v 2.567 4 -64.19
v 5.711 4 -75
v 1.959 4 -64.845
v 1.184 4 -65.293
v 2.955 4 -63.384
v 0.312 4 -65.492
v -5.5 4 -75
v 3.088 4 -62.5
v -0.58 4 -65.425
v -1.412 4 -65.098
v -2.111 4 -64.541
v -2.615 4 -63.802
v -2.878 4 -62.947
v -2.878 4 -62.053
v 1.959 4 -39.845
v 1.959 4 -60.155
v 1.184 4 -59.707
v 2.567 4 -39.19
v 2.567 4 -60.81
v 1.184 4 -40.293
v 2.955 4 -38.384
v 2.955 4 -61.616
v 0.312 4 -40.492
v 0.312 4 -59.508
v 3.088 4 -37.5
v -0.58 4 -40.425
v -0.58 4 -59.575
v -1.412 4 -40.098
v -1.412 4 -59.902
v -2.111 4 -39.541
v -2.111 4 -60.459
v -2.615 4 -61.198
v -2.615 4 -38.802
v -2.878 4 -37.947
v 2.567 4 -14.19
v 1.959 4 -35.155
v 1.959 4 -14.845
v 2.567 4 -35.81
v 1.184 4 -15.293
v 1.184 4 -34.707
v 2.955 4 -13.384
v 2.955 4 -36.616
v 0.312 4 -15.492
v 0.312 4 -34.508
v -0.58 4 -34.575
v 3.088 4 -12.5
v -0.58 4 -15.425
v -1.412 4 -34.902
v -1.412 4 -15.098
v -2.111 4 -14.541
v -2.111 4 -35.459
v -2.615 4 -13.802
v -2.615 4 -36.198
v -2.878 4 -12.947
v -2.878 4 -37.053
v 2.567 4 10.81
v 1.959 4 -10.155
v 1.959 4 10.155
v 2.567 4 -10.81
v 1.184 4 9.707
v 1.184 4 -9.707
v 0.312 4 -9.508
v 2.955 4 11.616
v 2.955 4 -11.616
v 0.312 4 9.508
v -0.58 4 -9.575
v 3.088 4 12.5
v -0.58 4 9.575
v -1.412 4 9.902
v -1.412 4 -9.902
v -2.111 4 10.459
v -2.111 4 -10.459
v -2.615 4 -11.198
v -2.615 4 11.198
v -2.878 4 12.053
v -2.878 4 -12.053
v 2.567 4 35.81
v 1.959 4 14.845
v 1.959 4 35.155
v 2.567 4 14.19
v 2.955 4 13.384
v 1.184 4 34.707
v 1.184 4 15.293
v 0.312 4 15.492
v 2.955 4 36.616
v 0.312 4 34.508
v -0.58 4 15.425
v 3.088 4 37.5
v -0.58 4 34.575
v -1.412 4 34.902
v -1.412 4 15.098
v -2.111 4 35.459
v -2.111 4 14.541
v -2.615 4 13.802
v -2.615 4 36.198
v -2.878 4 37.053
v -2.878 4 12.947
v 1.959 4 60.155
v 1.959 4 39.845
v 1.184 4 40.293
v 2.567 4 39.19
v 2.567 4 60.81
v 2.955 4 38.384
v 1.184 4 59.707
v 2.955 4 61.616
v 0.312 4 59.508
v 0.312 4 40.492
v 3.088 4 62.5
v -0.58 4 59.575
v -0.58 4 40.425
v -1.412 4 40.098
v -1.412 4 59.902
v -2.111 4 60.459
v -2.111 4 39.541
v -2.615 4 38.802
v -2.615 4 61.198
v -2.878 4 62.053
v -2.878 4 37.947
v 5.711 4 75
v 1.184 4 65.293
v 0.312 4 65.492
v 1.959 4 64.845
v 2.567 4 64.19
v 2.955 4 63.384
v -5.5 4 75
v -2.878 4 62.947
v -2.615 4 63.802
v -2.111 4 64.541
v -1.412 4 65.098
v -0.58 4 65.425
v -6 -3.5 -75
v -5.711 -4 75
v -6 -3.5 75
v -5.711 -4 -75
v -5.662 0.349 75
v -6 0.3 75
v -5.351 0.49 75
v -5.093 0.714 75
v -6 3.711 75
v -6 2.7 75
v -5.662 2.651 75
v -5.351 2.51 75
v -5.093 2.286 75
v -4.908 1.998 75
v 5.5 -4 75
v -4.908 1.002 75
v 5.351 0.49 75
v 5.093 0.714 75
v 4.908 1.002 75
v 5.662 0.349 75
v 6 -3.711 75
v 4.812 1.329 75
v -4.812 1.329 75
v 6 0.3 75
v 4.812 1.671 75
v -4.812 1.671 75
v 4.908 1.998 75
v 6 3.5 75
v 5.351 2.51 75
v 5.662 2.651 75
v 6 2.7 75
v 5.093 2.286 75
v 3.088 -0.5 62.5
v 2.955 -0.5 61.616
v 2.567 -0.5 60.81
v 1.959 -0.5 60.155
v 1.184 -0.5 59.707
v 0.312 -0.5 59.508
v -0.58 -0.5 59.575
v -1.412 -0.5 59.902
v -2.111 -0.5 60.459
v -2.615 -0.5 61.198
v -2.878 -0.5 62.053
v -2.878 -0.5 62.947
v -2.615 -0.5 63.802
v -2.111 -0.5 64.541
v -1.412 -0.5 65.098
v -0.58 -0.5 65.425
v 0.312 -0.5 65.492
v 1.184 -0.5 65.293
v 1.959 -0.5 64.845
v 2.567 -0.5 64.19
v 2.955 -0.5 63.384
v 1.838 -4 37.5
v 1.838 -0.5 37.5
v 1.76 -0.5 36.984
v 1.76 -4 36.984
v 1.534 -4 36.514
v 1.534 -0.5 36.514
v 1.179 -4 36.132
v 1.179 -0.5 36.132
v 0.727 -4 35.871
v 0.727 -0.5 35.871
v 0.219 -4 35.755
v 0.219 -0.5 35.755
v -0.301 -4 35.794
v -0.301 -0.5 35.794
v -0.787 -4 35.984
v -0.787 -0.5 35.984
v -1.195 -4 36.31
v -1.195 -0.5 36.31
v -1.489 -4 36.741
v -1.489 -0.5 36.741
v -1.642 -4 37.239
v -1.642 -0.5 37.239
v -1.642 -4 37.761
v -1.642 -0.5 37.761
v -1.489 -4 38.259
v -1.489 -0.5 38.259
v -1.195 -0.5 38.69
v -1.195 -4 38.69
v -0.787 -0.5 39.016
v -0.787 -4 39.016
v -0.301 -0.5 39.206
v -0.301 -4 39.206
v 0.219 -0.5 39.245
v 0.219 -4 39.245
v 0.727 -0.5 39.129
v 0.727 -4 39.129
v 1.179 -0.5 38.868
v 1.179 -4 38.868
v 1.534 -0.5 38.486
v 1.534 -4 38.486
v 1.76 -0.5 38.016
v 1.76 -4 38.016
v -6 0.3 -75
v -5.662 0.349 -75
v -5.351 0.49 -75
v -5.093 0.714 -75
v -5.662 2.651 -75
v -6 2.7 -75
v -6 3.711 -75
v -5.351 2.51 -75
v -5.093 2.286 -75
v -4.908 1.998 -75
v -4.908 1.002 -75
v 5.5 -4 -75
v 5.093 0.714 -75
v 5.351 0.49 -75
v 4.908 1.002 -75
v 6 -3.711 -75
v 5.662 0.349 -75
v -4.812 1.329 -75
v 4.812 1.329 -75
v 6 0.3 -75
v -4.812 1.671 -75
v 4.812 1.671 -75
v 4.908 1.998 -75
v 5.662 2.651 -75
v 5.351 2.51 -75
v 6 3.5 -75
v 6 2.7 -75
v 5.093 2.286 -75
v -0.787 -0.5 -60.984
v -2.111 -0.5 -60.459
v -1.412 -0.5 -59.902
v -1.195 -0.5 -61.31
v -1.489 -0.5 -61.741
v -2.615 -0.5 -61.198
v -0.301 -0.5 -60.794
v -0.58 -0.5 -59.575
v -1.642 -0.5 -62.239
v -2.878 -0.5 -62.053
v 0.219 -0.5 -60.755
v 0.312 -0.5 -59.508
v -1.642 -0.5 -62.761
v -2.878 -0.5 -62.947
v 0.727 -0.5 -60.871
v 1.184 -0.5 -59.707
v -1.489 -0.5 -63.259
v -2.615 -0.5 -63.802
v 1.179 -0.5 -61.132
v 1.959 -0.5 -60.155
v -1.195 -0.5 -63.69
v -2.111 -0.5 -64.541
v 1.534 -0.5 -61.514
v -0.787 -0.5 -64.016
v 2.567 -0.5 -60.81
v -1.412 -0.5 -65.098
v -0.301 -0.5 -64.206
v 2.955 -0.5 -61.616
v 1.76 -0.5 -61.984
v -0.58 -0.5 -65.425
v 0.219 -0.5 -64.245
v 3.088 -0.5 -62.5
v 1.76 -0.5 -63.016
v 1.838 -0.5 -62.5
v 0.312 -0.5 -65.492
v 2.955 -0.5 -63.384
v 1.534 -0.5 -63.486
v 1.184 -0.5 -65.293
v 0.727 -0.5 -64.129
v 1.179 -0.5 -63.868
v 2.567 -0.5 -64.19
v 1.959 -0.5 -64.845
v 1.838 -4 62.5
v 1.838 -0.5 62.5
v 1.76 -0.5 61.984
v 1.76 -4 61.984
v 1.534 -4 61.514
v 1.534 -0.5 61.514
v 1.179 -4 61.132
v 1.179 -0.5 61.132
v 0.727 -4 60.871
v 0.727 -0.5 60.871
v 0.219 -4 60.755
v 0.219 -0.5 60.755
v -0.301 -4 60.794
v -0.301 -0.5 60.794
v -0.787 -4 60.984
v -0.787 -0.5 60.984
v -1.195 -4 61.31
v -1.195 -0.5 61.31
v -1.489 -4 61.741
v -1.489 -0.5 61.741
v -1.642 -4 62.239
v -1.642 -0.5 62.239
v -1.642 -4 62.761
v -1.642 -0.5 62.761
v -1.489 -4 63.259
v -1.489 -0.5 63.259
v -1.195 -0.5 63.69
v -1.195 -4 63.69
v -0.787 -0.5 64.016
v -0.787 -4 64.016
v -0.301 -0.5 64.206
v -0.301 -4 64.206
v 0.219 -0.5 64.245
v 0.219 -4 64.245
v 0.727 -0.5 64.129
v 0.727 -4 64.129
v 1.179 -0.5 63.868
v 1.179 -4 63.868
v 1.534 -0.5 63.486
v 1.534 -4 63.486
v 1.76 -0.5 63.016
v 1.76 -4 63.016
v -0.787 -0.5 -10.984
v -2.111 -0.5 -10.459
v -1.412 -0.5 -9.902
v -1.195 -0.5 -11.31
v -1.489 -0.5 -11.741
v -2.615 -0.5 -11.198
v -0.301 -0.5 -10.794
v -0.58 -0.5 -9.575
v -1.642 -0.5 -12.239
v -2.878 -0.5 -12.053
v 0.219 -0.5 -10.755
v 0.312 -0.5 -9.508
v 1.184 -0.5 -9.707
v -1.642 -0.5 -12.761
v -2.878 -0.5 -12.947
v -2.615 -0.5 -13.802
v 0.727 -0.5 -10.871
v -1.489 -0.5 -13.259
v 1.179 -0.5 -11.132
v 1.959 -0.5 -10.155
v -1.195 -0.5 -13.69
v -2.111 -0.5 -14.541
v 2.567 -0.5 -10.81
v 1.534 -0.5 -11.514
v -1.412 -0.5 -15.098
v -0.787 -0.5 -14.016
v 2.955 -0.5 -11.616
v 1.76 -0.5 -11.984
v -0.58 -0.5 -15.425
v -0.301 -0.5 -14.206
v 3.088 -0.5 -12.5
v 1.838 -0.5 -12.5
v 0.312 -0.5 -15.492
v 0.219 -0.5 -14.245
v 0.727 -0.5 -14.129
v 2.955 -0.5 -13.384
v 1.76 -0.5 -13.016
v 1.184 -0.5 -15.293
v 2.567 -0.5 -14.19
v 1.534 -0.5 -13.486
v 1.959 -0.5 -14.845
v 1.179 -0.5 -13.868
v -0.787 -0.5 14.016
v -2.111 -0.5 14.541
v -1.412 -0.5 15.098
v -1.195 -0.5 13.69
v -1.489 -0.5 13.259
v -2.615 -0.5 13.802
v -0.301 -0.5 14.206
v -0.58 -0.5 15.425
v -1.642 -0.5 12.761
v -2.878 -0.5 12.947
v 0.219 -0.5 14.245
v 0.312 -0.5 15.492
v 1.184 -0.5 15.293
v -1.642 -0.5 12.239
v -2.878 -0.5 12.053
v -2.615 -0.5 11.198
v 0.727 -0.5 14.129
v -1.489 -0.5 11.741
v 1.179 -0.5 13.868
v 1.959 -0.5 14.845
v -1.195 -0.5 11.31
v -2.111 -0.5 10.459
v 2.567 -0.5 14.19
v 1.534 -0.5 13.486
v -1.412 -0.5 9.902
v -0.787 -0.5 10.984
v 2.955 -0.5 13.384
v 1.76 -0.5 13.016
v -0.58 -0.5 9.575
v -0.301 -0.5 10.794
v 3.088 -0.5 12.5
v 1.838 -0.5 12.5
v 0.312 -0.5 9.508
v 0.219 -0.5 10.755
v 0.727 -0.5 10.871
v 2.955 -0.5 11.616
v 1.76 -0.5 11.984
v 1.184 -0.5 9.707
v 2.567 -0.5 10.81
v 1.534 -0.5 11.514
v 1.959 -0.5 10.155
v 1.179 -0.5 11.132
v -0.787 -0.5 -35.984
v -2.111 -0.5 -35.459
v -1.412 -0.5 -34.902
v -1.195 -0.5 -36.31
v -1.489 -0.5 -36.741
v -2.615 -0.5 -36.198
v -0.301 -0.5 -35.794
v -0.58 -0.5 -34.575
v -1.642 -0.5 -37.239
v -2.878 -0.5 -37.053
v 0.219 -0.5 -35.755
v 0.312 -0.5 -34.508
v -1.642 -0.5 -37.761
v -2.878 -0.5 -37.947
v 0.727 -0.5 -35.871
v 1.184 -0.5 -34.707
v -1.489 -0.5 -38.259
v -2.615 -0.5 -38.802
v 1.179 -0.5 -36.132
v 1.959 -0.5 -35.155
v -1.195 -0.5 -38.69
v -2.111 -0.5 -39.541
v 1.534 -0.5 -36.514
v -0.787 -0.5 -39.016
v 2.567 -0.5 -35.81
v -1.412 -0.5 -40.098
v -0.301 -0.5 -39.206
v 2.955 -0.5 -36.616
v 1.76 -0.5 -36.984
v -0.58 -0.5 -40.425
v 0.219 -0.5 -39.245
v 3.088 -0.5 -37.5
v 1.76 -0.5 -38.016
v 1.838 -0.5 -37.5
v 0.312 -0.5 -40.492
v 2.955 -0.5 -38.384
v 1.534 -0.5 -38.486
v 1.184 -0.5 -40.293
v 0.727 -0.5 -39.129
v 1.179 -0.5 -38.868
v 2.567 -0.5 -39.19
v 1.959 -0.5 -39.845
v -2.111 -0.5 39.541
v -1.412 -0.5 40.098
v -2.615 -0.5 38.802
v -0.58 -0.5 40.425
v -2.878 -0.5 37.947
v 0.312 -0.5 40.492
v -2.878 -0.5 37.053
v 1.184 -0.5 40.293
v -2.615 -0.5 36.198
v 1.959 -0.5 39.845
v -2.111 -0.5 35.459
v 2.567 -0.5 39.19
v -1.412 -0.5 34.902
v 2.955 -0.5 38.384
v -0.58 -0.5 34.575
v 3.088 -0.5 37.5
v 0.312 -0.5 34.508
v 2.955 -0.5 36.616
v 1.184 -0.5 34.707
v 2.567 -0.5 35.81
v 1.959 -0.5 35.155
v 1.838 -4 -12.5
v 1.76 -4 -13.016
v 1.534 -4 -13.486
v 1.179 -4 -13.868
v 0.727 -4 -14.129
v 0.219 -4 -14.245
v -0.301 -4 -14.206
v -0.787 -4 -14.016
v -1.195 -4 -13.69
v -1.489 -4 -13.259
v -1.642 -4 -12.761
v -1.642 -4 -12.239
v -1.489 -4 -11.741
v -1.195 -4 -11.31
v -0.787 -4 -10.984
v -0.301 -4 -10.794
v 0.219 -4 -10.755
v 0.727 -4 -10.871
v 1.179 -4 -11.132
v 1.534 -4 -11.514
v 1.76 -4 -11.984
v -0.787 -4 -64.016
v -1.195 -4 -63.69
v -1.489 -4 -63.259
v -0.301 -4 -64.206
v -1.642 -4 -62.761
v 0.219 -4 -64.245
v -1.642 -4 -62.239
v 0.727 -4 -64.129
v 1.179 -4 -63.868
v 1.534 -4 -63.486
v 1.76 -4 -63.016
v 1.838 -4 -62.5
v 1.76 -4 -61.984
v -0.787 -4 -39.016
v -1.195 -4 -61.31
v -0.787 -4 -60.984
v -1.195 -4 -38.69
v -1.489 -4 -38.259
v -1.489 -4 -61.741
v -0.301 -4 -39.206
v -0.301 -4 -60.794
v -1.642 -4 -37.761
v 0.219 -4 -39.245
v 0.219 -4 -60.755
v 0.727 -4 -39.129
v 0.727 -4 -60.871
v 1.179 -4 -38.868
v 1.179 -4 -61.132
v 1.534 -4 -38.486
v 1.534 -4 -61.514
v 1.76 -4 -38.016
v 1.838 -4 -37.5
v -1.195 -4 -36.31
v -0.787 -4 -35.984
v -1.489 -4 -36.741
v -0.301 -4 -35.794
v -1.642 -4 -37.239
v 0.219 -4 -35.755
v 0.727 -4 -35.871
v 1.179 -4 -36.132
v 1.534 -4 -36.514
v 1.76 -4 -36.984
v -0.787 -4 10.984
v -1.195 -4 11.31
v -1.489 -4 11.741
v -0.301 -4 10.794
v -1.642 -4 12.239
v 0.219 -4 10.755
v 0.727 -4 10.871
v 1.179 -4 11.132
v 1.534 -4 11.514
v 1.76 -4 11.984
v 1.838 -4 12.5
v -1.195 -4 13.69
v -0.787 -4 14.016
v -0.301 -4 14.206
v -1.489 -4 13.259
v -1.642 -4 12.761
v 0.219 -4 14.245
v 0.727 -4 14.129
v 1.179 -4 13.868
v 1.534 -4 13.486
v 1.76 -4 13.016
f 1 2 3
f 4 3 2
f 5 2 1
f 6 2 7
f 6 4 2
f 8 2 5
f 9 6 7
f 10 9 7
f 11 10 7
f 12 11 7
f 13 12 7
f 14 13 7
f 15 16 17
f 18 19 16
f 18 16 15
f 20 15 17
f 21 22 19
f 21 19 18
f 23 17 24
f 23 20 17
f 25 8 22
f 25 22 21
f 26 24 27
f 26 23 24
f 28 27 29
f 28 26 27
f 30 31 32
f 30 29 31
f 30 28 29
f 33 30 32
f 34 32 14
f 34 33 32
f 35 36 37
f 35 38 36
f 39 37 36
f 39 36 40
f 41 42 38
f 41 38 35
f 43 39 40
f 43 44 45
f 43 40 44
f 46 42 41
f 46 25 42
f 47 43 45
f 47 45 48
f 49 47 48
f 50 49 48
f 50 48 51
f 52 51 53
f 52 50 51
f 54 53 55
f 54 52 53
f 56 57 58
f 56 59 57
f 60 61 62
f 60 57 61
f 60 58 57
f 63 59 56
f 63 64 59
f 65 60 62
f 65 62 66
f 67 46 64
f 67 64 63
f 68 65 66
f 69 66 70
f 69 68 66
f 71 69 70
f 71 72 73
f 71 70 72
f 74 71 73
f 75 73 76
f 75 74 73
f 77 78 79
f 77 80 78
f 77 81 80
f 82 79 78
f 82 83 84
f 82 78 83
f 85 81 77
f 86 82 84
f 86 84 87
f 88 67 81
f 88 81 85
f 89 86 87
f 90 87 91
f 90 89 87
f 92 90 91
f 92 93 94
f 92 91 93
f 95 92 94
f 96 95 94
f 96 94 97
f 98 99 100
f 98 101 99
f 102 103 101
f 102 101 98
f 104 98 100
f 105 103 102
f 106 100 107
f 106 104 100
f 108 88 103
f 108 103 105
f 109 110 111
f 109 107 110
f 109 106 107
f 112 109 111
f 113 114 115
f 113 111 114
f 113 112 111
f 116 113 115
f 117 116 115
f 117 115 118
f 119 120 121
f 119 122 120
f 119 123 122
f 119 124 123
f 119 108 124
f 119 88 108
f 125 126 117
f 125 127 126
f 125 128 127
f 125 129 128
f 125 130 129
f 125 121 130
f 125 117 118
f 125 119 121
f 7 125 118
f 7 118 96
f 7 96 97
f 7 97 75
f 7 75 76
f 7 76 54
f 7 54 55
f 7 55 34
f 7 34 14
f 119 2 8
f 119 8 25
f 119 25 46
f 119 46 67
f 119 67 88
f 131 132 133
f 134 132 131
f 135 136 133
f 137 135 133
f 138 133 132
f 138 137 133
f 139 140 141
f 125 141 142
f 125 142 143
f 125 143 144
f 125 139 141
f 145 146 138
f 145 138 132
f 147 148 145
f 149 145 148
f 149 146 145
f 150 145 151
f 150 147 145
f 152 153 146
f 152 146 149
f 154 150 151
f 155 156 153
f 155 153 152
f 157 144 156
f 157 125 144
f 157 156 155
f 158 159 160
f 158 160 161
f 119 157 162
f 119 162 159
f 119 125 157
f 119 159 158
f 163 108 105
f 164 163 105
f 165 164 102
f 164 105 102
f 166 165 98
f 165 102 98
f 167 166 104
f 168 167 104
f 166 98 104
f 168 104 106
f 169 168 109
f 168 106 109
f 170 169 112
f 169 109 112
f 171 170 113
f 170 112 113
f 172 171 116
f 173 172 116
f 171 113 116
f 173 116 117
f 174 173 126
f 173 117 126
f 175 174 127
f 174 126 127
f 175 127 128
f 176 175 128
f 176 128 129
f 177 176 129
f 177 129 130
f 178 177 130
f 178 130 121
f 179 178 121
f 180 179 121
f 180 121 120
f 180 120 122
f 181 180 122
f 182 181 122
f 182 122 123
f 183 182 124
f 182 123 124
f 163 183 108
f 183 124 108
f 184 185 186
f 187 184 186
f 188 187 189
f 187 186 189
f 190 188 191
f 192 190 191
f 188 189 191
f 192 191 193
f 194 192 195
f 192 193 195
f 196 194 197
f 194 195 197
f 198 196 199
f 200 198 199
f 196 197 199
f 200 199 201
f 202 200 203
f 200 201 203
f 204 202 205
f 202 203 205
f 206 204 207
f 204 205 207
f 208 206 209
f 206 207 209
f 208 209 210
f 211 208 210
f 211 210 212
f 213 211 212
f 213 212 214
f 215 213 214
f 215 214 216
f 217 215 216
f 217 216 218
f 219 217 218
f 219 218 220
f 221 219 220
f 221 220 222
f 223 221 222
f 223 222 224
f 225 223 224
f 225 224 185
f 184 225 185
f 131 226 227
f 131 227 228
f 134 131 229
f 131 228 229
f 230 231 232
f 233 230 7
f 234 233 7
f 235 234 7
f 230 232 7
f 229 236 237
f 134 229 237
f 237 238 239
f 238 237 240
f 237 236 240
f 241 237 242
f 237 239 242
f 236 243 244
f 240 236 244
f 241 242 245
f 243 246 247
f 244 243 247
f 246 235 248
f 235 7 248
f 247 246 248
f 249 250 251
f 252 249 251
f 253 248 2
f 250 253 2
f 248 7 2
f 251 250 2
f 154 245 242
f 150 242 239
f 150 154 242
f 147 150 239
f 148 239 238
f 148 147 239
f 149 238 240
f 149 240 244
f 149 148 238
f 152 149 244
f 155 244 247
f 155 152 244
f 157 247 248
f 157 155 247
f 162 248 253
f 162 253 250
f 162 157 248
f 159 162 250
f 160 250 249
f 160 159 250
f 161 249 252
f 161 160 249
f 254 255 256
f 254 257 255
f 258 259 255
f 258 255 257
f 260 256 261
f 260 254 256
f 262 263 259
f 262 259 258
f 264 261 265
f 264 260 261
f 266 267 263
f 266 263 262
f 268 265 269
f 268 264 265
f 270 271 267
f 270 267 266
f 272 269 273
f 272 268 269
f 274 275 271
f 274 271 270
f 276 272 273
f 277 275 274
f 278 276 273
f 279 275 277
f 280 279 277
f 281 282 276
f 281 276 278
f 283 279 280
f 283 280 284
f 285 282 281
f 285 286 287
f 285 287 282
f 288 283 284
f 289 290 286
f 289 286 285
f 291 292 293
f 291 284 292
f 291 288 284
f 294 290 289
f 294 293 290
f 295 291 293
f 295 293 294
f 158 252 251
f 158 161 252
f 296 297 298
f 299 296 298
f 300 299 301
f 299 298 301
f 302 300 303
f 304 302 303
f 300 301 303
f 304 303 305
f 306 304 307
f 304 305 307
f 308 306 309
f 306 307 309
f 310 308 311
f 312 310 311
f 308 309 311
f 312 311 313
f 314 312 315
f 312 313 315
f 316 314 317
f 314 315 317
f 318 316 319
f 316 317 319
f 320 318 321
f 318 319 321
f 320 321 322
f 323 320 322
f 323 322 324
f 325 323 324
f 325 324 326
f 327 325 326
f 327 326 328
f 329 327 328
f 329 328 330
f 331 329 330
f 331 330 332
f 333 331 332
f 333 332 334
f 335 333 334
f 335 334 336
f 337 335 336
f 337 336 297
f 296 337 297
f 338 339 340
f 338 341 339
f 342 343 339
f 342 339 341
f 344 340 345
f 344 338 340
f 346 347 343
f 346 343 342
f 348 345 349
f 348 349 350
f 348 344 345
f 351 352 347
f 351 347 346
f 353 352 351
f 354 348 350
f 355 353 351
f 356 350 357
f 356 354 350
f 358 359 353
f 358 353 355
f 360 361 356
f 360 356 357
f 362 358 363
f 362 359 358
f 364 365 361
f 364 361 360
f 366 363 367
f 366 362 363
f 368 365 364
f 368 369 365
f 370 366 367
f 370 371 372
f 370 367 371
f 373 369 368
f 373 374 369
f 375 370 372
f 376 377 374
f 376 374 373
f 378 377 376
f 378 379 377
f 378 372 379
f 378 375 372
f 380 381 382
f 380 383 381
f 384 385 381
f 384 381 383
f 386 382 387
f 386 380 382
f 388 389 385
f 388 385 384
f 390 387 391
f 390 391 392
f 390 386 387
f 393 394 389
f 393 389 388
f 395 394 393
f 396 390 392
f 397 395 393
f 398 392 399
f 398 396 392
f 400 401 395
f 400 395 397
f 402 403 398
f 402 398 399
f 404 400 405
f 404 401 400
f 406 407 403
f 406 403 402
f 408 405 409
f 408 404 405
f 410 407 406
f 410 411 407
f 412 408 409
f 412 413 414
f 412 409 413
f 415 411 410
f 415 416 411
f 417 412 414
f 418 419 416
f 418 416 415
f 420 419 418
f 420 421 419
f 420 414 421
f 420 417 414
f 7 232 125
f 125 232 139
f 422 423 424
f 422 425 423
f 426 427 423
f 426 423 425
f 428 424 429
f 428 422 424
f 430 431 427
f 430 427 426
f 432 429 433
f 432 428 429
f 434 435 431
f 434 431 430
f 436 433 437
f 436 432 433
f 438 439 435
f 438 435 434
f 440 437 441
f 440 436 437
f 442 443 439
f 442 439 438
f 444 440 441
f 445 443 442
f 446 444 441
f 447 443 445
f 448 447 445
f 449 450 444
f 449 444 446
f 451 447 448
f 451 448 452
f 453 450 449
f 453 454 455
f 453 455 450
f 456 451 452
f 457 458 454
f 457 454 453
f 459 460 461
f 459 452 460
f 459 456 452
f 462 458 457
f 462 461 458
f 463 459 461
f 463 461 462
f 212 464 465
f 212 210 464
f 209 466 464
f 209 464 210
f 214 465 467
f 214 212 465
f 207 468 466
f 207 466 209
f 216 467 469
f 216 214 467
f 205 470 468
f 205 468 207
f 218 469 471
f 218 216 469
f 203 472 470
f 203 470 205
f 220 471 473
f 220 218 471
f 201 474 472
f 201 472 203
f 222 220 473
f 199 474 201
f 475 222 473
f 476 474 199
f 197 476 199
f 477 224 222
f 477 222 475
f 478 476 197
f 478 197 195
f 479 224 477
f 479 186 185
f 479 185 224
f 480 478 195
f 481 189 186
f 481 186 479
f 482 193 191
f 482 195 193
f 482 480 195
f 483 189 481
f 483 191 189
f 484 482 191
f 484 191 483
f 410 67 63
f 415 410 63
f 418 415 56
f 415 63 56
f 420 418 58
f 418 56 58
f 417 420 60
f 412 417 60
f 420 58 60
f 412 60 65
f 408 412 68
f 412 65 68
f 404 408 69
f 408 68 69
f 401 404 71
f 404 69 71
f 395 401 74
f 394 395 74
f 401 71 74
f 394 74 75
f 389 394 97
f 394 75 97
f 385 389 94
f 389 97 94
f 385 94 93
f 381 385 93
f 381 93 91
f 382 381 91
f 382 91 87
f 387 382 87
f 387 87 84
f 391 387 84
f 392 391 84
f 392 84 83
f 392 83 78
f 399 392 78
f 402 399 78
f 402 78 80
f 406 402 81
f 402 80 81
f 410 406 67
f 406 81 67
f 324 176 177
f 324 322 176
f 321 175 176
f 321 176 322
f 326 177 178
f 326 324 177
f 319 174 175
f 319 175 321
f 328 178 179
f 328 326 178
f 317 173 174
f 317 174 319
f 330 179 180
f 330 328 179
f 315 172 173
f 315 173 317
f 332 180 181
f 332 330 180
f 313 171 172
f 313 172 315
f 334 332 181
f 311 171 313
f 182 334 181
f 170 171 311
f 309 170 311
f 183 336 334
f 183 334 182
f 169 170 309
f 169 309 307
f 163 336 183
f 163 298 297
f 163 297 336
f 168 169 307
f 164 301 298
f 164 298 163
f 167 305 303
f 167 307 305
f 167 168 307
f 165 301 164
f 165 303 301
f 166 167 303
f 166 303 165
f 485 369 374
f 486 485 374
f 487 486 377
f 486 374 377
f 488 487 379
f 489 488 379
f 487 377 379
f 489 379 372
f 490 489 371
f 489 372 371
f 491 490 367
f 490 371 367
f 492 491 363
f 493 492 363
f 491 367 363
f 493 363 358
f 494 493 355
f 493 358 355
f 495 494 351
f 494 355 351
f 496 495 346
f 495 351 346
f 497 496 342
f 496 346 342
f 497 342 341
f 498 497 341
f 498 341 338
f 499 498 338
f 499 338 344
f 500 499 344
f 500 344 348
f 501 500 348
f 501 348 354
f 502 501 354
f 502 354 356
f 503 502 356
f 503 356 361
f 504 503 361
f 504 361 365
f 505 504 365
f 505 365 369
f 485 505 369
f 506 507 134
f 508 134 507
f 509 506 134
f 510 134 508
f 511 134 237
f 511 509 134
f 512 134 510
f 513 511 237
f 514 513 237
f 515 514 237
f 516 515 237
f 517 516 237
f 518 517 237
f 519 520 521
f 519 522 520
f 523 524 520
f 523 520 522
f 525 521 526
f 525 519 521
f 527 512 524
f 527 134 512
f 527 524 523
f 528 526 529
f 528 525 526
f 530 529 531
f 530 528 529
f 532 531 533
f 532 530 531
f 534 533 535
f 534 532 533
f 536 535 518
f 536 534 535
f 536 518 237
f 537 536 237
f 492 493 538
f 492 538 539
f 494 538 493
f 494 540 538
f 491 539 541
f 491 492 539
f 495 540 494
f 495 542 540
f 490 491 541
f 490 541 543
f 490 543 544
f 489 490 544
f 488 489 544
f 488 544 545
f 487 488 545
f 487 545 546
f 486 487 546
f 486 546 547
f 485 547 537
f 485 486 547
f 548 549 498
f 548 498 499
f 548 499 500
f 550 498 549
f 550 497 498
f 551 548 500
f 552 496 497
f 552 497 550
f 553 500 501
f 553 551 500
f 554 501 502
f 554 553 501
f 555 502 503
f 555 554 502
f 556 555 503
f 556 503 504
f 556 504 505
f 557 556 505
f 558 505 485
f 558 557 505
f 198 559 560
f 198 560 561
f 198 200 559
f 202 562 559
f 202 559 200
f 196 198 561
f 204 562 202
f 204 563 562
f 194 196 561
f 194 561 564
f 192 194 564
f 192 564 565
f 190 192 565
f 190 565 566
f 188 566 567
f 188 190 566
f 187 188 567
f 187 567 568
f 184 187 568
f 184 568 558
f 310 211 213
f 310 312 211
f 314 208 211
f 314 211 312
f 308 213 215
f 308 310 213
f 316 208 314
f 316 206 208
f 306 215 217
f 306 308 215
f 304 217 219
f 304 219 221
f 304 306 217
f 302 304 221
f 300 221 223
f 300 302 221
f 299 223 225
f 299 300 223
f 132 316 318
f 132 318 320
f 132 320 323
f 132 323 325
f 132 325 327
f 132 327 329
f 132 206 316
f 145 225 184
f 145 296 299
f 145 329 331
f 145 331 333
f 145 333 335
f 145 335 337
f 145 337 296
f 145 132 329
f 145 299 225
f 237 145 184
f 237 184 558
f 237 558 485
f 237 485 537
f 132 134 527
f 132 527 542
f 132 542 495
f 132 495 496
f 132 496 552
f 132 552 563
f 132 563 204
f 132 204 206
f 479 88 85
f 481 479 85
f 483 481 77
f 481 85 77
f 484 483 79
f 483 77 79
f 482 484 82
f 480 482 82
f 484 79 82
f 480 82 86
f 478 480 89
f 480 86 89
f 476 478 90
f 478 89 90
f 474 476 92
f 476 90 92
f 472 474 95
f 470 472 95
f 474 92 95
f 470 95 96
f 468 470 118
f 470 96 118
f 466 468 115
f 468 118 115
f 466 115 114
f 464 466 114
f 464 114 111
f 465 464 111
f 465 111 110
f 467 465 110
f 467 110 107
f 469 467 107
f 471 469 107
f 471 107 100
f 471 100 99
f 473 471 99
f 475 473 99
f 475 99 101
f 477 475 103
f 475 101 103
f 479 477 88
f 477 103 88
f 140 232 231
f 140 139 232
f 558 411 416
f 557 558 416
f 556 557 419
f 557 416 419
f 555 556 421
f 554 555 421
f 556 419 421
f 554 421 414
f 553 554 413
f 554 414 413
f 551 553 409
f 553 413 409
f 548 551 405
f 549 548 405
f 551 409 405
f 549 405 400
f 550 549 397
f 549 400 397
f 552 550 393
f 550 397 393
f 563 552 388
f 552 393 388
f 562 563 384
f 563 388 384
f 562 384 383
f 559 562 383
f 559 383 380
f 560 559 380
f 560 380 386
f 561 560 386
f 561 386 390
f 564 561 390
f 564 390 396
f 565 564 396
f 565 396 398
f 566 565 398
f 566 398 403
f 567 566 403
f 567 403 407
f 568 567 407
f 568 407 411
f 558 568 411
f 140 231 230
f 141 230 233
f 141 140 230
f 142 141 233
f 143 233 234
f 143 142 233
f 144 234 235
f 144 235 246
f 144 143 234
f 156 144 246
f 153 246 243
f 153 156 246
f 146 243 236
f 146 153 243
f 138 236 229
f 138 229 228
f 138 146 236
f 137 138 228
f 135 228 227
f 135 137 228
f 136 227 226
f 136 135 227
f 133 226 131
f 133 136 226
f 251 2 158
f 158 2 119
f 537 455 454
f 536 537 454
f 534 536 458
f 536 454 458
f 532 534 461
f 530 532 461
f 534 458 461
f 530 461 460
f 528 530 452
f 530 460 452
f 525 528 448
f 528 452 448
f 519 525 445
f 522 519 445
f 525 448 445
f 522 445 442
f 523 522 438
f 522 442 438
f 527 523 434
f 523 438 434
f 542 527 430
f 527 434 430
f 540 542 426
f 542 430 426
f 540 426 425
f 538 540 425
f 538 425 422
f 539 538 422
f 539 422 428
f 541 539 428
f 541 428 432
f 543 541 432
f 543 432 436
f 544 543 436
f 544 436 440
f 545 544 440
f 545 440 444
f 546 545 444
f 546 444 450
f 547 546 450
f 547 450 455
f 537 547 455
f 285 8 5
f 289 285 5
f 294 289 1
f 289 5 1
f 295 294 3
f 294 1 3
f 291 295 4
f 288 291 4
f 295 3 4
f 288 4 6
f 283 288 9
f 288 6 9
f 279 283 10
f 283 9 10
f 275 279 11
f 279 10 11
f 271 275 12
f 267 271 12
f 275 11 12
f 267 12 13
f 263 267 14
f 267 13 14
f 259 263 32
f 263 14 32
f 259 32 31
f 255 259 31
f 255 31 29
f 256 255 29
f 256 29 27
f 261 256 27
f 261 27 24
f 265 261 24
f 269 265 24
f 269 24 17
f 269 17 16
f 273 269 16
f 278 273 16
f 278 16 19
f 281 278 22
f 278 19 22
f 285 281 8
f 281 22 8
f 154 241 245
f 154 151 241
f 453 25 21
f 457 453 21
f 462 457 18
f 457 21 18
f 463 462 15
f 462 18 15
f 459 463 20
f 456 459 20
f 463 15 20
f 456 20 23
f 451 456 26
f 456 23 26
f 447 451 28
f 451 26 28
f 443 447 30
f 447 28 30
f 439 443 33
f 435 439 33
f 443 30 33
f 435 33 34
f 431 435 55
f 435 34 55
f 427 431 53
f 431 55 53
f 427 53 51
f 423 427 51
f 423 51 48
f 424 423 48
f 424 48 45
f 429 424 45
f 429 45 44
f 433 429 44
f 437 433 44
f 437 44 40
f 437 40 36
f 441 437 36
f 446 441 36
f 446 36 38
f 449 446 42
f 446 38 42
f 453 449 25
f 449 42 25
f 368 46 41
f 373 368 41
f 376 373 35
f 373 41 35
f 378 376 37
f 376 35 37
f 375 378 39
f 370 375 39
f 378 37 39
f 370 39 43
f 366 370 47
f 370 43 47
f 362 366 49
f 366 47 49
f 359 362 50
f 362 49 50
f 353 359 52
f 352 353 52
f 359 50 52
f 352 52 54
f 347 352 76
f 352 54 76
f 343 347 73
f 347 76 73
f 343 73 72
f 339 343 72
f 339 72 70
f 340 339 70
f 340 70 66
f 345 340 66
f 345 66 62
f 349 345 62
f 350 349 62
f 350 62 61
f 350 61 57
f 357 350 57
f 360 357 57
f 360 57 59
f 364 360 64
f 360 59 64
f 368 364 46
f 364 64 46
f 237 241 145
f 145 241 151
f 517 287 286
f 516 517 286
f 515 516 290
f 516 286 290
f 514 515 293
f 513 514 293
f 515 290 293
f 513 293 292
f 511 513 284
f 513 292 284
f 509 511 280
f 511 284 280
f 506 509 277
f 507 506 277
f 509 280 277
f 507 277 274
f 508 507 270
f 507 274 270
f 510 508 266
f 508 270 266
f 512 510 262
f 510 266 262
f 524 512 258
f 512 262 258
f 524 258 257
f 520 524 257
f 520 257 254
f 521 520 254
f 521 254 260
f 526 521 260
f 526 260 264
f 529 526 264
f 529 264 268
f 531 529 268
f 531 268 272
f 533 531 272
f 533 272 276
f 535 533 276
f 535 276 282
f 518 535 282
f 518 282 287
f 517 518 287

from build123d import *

# Parameters (mm, degrees)
BOSS_EXTRUDE1_DEPTH   = 75
CHAMFER1_SIZE         = 0.5
CHAMFER1_SIZE2        = 0.288675135
CHAMFER1_PART_2_SIZE  = 0.5
CHAMFER1_PART_2_SIZE2 = 0.288675135
CHAMFER1_PART_3_SIZE  = 0.5
CHAMFER1_PART_3_SIZE2 = 0.288675135
CHAMFER1_PART_4_SIZE  = 0.5
CHAMFER1_PART_4_SIZE2 = 0.288675135
SKETCH2_R             = 1.75
CUT_EXTRUDE1_DEPTH    = 8
SKETCH3_R             = 3
CUT_EXTRUDE2_DEPTH    = 4.5
LPATTERN1_COUNT       = 6
LPATTERN1_PITCH       = 25


with BuildPart() as part:
    # Sketch1 → Boss-Extrude1 (new body, symmetric)
    with BuildSketch(Plane.XY):
        with BuildLine():
            Line((-6, -4), (6, -4))
            Line((6, -4), (6, 0.3))
            ThreePointArc((6, 0.3), (4.8, 1.5), (6, 2.7))
            Line((6, 2.7), (6, 4))
            Line((6, 4), (-6, 4))
            Line((-6, 4), (-6, 2.7))
            ThreePointArc((-6, 2.7), (-4.8, 1.5), (-6, 0.3))
            Line((-6, 0.3), (-6, -4))
        make_face()
    extrude(amount=BOSS_EXTRUDE1_DEPTH, both=True)

    # Chamfer1
    chamfer1_edges = [part.edges().sort_by_distance(p)[0] for p in [
        (6, -4, 0),
    ]]
    chamfer1_side = [part.faces().sort_by_distance(p)[0] for p in [
        (0, -4, 0),
    ]]
    chamfer(chamfer1_edges, length=CHAMFER1_SIZE, length2=CHAMFER1_SIZE2, reference=chamfer1_side[0])

    # Chamfer1 part 2
    chamfer1_part_2_edges = [part.edges().sort_by_distance(p)[0] for p in [
        (-6, -4, 0),
    ]]
    chamfer1_part_2_side = [part.faces().sort_by_distance(p)[0] for p in [
        (-6, -1.85, 0),
    ]]
    chamfer(chamfer1_part_2_edges, length=CHAMFER1_PART_2_SIZE, length2=CHAMFER1_PART_2_SIZE2, reference=chamfer1_part_2_side[0])

    # Chamfer1 part 3
    chamfer1_part_3_edges = [part.edges().sort_by_distance(p)[0] for p in [
        (-6, 4, 0),
    ]]
    chamfer1_part_3_side = [part.faces().sort_by_distance(p)[0] for p in [
        (0, 4, 0),
    ]]
    chamfer(chamfer1_part_3_edges, length=CHAMFER1_PART_3_SIZE, length2=CHAMFER1_PART_3_SIZE2, reference=chamfer1_part_3_side[0])

    # Chamfer1 part 4
    chamfer1_part_4_edges = [part.edges().sort_by_distance(p)[0] for p in [
        (6, 4, 0),
    ]]
    chamfer1_part_4_side = [part.faces().sort_by_distance(p)[0] for p in [
        (6, 3.35, 0),
    ]]
    chamfer(chamfer1_part_4_edges, length=CHAMFER1_PART_4_SIZE, length2=CHAMFER1_PART_4_SIZE2, reference=chamfer1_part_4_side[0])

    # Sketch2 → Cut-Extrude1 (cut)
    with BuildSketch(Plane(origin=(0, 4, 0), x_dir=(1, 0, 0), z_dir=(0, 1, 0))):
        with Locations((0.088052027, -62.5)):
            Circle(SKETCH2_R)
    cut_extrude1 = extrude(amount=-CUT_EXTRUDE1_DEPTH, mode=Mode.SUBTRACT)

    # Sketch3 → Cut-Extrude2 (cut)
    with BuildSketch(Plane(origin=(0, 4, 0), x_dir=(1, 0, 0), z_dir=(0, 1, 0))):
        with Locations((0.088052027, -62.5)):
            Circle(SKETCH3_R)
    cut_extrude2 = extrude(amount=-CUT_EXTRUDE2_DEPTH, mode=Mode.SUBTRACT)

    # LPattern1: Cut-Extrude1, Cut-Extrude2 ×6
    with Locations(*[(0, 0, -i * LPATTERN1_PITCH) for i in range(1, LPATTERN1_COUNT)]):
        add(cut_extrude1, mode=Mode.SUBTRACT)
        add(cut_extrude2, mode=Mode.SUBTRACT)


solid = part.part
